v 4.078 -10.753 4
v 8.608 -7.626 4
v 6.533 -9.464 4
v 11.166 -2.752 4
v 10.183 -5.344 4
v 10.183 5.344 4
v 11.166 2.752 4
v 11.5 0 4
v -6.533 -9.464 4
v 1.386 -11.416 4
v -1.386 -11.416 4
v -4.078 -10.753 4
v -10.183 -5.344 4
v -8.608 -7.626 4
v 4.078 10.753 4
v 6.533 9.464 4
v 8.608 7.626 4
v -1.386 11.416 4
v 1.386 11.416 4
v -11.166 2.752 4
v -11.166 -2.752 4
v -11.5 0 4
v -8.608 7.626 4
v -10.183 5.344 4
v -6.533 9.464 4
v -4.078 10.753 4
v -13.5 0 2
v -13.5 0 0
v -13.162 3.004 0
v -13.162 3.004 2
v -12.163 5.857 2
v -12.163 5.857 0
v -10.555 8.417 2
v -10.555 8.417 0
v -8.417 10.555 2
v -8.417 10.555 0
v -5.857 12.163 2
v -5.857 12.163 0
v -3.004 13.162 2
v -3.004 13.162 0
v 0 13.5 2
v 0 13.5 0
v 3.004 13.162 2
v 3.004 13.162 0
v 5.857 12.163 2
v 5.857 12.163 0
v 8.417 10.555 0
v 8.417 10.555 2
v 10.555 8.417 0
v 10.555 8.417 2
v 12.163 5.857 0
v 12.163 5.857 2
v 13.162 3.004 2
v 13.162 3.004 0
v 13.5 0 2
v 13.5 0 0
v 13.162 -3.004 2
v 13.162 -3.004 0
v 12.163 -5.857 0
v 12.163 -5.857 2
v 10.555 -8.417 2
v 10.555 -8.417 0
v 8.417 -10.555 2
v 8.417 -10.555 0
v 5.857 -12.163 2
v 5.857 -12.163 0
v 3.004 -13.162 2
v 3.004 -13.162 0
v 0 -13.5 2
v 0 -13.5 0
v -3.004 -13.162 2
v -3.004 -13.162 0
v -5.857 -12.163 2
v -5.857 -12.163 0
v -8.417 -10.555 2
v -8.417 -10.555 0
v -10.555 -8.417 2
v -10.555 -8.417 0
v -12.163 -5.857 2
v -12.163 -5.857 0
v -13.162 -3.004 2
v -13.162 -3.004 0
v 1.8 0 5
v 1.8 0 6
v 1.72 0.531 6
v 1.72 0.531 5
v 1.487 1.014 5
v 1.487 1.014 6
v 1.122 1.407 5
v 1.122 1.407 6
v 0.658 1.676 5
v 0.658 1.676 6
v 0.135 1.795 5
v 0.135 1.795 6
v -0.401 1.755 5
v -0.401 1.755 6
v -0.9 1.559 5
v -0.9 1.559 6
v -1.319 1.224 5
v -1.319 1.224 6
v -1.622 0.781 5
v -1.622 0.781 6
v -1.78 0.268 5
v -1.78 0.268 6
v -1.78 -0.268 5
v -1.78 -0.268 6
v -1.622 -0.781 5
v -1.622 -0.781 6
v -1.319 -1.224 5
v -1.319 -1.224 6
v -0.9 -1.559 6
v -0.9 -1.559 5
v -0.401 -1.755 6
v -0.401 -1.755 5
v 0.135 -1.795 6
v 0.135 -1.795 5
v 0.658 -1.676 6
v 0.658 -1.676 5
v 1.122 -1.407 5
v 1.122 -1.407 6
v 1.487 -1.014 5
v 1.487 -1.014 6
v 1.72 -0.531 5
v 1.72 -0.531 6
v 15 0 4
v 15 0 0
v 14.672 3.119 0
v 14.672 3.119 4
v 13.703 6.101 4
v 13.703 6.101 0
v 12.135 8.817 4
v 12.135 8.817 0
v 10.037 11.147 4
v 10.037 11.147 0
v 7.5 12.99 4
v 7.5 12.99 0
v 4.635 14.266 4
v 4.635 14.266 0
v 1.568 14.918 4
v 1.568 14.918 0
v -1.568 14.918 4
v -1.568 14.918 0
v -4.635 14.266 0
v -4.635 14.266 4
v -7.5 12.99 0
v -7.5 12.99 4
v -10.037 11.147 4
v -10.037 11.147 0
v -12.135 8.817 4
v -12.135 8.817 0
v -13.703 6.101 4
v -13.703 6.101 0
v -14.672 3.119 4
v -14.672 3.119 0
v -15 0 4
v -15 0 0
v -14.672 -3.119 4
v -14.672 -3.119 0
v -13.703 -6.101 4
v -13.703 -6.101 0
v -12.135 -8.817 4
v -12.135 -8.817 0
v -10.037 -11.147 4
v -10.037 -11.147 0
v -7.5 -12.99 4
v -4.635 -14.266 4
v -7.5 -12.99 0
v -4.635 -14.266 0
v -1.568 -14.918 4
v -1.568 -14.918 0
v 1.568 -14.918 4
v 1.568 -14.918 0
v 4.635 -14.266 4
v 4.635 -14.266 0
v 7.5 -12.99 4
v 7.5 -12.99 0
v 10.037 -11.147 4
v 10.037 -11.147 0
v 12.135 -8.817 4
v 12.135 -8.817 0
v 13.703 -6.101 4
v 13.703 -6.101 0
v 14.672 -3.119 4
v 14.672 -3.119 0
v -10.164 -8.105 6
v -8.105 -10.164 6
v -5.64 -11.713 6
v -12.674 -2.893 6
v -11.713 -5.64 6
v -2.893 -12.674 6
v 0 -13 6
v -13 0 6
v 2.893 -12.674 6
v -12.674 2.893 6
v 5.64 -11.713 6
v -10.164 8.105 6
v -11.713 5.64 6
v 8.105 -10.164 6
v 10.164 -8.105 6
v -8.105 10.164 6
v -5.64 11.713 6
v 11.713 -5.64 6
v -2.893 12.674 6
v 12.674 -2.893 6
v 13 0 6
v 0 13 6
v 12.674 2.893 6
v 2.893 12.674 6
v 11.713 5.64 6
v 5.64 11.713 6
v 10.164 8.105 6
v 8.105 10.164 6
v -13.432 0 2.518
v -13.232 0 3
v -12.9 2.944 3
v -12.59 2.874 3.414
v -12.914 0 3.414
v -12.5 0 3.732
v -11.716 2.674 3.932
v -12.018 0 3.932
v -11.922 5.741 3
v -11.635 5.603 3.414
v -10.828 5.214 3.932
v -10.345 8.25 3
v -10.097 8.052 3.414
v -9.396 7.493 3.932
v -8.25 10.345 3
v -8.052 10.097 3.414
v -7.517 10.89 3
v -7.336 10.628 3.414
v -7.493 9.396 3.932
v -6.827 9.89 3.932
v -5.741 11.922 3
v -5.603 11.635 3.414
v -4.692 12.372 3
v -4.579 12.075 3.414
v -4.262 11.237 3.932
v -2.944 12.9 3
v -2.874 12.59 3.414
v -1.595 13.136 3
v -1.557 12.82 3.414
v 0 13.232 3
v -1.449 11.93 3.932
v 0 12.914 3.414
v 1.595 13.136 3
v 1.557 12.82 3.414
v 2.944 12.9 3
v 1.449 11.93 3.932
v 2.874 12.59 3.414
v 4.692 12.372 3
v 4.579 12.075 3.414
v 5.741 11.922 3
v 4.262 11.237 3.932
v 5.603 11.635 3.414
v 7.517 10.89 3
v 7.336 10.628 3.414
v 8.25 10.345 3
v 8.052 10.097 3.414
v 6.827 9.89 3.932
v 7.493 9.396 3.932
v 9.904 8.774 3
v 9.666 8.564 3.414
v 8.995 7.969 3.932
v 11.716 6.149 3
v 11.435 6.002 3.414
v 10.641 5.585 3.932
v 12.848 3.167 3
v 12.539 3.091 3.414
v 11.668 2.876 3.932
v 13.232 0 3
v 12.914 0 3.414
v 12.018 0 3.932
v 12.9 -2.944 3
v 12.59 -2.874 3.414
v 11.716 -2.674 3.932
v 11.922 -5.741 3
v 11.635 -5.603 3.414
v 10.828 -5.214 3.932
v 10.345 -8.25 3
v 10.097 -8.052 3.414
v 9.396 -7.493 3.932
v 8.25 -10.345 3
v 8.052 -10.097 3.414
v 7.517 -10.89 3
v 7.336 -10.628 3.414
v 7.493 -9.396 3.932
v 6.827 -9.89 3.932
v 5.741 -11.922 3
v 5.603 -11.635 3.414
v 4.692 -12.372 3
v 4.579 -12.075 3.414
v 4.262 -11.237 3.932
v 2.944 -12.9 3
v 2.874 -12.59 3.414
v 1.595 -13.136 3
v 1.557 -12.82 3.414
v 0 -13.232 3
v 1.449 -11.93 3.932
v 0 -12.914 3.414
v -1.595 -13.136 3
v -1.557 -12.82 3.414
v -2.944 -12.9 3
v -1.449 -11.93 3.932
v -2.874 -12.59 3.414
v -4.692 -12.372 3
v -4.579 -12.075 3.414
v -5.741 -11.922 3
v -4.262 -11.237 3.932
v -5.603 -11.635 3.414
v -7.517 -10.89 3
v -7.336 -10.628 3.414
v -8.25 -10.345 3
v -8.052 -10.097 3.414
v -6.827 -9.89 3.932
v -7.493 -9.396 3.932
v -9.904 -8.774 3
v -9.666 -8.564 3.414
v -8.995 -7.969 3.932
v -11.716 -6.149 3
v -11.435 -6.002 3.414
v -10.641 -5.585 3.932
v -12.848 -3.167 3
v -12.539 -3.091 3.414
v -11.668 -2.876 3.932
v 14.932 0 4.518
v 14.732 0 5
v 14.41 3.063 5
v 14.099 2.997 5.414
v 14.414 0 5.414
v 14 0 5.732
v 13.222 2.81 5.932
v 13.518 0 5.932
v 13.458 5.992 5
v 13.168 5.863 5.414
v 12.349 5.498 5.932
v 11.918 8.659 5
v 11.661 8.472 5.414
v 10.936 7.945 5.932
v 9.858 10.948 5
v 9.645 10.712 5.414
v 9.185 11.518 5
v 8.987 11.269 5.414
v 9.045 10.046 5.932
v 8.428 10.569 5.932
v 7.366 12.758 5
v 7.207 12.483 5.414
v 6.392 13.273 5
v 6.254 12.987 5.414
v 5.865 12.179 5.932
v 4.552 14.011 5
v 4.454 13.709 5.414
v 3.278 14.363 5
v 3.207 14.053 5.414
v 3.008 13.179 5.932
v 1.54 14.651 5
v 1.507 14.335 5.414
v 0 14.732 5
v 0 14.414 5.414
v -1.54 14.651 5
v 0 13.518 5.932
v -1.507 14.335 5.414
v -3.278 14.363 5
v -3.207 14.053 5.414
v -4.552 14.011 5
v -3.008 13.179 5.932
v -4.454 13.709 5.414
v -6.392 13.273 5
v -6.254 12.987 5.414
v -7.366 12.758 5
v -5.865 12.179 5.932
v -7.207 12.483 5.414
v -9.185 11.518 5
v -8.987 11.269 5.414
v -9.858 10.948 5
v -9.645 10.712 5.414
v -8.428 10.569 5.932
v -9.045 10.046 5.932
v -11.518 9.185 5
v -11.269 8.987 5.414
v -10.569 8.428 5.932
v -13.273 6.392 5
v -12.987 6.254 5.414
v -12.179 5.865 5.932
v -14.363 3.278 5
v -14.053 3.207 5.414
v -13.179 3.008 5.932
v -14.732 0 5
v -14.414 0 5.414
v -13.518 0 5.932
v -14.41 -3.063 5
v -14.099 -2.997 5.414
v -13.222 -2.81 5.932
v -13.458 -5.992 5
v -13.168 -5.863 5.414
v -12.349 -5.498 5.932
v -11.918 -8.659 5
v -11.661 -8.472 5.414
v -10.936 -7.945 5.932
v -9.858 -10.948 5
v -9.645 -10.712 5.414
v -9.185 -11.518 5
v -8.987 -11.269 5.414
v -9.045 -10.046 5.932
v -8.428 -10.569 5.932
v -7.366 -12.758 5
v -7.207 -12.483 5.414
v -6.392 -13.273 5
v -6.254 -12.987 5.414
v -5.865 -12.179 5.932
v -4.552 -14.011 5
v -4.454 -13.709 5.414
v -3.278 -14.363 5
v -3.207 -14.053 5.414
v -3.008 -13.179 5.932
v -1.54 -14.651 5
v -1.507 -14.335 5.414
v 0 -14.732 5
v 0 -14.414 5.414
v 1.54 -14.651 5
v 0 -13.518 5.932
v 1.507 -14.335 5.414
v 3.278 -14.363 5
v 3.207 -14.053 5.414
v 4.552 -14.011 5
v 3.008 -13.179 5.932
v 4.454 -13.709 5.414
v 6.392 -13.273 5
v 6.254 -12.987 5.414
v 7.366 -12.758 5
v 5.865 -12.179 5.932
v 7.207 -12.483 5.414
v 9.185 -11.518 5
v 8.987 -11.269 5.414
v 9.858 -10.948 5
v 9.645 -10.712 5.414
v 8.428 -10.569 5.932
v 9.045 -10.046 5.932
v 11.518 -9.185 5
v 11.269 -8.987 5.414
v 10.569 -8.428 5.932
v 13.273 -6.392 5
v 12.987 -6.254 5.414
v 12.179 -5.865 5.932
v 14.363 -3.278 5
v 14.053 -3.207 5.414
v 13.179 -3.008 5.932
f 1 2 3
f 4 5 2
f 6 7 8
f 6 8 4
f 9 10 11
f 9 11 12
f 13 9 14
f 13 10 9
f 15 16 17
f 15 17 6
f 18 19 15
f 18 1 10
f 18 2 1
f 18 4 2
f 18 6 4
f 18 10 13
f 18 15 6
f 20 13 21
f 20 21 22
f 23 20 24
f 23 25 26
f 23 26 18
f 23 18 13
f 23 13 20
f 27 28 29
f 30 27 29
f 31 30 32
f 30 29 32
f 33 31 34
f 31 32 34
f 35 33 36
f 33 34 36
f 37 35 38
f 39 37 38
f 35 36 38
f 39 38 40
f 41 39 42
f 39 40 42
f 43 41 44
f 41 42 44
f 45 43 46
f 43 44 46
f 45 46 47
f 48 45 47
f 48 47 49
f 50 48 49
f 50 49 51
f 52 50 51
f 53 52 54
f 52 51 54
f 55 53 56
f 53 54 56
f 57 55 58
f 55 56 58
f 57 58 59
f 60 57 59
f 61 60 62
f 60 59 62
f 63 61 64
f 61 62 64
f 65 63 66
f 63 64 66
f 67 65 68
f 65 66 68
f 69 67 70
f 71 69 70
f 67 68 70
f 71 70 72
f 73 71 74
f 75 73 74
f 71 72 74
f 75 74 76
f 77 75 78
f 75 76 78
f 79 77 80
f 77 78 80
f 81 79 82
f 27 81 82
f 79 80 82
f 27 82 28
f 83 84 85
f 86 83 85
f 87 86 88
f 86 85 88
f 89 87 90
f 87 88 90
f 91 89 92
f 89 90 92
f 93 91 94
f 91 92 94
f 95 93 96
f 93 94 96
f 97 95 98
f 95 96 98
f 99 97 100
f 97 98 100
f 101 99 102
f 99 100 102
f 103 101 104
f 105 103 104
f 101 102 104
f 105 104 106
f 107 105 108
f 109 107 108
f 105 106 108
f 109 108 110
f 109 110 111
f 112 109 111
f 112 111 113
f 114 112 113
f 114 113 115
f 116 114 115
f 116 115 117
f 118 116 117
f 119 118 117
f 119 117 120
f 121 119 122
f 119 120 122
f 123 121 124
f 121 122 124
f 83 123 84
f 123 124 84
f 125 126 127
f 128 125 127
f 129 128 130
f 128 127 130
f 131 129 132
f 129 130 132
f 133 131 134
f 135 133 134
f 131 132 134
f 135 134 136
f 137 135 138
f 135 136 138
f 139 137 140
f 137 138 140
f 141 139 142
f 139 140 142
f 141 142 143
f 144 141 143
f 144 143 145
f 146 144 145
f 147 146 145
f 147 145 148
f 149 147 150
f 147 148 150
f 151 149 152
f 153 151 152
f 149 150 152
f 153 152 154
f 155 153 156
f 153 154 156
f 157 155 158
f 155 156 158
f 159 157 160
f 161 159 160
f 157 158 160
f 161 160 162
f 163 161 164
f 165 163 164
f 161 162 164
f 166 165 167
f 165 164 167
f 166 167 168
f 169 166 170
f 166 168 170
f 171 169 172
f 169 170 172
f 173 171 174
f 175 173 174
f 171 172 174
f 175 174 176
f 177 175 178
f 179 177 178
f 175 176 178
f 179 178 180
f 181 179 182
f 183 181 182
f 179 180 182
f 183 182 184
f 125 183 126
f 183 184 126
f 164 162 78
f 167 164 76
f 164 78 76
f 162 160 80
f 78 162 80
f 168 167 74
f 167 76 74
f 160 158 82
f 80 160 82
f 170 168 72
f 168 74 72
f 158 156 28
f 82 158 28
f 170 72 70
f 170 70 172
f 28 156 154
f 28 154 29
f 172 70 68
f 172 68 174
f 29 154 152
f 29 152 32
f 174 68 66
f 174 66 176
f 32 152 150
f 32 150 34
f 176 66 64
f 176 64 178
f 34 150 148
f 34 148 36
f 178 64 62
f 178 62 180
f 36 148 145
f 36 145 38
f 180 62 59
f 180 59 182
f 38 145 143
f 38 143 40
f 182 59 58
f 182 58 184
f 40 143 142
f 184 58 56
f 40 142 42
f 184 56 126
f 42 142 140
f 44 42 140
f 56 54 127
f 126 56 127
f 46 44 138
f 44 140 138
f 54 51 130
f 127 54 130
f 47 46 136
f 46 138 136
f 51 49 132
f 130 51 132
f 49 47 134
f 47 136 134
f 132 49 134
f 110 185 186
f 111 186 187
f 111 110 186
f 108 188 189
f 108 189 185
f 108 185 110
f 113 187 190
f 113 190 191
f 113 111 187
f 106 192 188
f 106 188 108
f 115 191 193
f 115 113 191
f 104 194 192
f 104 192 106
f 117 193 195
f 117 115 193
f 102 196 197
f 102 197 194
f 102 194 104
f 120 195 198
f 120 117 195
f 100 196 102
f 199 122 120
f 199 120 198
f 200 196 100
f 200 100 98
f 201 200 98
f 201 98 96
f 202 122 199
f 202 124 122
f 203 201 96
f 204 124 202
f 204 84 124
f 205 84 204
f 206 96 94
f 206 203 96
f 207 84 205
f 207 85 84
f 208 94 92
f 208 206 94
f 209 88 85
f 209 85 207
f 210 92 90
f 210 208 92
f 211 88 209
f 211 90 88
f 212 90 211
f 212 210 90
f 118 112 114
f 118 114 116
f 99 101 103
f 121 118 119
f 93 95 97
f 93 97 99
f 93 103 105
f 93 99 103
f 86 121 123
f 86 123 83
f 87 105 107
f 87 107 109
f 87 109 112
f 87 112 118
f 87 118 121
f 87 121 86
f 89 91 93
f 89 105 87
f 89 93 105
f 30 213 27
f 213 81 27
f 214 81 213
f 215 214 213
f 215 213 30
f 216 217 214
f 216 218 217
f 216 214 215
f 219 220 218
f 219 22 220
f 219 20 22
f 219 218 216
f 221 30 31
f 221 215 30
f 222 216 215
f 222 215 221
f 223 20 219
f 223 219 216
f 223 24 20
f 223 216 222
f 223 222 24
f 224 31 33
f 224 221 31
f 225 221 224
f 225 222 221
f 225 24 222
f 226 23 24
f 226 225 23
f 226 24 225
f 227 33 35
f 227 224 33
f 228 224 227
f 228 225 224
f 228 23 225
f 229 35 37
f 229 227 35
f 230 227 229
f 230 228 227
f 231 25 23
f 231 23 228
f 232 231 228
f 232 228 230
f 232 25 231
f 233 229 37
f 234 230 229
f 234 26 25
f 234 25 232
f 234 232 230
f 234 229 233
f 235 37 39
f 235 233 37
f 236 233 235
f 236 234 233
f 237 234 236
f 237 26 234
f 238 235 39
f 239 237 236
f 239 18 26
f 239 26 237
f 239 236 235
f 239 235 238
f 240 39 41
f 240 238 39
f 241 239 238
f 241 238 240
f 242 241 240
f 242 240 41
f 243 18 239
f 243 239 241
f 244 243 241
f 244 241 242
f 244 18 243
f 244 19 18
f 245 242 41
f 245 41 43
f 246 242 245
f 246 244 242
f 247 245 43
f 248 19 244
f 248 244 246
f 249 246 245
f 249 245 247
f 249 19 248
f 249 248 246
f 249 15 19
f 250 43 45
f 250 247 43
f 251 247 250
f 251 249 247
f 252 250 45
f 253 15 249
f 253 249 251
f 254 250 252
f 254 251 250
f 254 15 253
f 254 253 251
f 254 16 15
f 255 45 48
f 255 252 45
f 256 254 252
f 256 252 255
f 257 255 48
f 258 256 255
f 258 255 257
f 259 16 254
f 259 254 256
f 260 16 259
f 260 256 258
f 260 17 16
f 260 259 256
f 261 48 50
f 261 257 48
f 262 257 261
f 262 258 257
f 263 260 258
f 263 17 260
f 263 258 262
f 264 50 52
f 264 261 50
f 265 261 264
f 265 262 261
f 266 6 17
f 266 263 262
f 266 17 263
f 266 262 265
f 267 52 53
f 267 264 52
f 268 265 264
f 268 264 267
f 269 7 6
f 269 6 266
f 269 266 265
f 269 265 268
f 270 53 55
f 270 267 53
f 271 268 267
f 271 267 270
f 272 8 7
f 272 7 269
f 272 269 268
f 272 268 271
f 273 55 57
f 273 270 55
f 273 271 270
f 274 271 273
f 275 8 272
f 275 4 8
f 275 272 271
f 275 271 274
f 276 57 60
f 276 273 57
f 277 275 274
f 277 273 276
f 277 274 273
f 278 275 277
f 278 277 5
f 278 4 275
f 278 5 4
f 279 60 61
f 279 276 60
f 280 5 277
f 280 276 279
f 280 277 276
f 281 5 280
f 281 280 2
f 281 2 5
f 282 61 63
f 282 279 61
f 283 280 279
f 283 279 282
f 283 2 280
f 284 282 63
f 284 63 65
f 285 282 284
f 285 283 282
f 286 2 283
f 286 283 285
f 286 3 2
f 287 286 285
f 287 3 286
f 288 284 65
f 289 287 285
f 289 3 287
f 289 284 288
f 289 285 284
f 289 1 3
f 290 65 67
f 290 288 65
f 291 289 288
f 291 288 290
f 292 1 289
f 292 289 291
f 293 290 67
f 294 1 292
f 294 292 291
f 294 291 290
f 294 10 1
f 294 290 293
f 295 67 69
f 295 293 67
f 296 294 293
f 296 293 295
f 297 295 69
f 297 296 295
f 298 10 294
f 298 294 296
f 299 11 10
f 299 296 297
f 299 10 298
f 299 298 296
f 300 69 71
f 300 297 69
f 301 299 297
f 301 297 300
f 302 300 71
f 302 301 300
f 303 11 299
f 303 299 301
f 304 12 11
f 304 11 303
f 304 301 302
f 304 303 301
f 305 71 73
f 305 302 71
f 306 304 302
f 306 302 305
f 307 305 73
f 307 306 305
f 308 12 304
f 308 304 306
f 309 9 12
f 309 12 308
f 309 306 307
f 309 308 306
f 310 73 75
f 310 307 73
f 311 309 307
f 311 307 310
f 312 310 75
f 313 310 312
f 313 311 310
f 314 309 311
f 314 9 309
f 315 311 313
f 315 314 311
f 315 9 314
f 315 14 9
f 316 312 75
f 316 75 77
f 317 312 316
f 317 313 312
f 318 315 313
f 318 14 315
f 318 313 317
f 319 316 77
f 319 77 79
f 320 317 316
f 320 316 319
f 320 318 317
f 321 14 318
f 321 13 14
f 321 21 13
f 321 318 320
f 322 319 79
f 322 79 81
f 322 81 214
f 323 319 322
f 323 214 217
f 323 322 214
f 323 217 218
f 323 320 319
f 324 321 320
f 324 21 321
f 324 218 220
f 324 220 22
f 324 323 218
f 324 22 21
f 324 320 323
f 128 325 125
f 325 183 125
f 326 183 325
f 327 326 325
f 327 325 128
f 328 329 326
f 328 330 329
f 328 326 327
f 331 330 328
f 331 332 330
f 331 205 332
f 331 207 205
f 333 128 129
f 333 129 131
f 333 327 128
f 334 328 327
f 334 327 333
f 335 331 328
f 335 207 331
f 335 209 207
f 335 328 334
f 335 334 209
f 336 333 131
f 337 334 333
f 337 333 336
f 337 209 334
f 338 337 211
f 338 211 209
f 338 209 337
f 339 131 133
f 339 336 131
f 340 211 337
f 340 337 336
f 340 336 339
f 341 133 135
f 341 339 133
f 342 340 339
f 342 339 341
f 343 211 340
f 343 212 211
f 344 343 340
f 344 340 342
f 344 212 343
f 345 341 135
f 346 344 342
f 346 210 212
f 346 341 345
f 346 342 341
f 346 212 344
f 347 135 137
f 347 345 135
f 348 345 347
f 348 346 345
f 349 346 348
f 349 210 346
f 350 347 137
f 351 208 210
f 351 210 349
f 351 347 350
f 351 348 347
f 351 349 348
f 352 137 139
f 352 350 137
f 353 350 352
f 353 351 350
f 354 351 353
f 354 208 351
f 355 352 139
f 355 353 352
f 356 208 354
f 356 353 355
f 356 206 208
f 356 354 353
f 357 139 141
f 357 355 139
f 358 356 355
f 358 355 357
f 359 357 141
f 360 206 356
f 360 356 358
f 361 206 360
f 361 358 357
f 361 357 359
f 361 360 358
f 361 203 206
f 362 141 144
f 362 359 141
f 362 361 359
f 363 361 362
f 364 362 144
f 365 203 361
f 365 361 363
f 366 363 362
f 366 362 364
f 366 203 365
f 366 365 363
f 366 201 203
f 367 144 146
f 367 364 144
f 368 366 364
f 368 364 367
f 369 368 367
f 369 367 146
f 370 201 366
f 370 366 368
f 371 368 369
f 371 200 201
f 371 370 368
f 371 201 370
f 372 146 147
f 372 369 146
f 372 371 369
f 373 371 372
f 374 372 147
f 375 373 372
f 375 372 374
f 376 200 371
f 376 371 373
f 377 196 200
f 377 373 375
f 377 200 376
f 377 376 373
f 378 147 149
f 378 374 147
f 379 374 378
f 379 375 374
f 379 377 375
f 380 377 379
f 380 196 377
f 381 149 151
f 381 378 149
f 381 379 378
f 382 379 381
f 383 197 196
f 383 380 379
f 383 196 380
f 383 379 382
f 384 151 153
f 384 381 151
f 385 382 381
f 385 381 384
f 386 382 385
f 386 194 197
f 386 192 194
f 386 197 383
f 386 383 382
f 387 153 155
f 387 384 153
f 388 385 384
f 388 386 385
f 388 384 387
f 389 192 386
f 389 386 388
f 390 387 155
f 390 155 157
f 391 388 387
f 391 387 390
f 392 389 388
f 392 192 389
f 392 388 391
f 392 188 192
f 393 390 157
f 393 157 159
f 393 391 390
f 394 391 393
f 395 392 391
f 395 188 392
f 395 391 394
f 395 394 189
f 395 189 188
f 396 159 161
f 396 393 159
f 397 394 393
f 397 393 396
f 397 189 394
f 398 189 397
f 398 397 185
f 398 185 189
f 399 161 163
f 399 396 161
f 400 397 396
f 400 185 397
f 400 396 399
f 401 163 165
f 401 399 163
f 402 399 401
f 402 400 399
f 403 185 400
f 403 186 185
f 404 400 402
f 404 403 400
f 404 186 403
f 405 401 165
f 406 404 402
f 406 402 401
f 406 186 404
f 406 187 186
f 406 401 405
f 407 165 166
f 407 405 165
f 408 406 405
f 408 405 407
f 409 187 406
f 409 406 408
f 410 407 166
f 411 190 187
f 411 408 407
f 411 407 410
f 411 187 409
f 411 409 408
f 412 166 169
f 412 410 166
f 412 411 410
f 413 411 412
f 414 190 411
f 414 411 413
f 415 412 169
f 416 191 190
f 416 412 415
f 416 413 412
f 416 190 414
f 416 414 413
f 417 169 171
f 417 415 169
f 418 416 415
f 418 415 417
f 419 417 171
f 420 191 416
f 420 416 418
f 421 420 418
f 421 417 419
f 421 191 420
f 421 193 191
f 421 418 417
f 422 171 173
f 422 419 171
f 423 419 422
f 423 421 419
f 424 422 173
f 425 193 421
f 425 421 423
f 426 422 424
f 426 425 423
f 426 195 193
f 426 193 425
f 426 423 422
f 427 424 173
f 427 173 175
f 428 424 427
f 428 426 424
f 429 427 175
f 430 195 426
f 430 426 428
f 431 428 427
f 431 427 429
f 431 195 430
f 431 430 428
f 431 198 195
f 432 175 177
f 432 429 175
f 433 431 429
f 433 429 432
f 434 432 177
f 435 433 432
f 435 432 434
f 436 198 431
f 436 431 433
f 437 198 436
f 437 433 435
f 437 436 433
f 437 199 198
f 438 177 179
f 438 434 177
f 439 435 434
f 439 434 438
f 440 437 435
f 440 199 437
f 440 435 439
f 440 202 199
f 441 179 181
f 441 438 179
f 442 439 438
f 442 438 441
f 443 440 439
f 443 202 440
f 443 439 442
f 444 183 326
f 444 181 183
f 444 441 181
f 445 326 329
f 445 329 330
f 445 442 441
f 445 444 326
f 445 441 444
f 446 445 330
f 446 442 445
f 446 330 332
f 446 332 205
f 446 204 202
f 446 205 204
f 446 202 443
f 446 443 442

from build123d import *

# Parameters (mm, degrees)
SKETCH1_R           = 15
BOSS_EXTRUDE1_DEPTH = 6
FILLET1_R           = 2
SKETCH2_R           = 13.5
CUT_EXTRUDE1_DEPTH  = 4
FILLET2_R           = 2
SKETCH4_R           = 1.8
CUT_EXTRUDE3_DEPTH  = 1


with BuildPart() as part:
    # Sketch1 → Boss-Extrude1 (new body)
    with BuildSketch(Plane.XY):
        Circle(SKETCH1_R)
    extrude(amount=BOSS_EXTRUDE1_DEPTH)

    # Fillet1
    fillet1_edges = [part.edges().sort_by_distance(p)[0] for p in [
        (-15, 0, 6),
    ]]
    fillet(fillet1_edges, radius=FILLET1_R)

    # Sketch2 → Cut-Extrude1 (cut)
    with BuildSketch(Plane(origin=(0, 0, 0), x_dir=(-1, 0, 0), z_dir=(0, 0, -1))):
        Circle(SKETCH2_R)
    extrude(amount=-CUT_EXTRUDE1_DEPTH, mode=Mode.SUBTRACT)

    # Fillet2
    fillet2_edges = [part.edges().sort_by_distance(p)[0] for p in [
        (13.5, 0, 4),
    ]]
    fillet(fillet2_edges, radius=FILLET2_R)

    # Sketch4 → Cut-Extrude3 (cut)
    with BuildSketch(Plane.XY.offset(6)):
        Circle(SKETCH4_R)
    extrude(amount=-CUT_EXTRUDE3_DEPTH, mode=Mode.SUBTRACT)


solid = part.part
